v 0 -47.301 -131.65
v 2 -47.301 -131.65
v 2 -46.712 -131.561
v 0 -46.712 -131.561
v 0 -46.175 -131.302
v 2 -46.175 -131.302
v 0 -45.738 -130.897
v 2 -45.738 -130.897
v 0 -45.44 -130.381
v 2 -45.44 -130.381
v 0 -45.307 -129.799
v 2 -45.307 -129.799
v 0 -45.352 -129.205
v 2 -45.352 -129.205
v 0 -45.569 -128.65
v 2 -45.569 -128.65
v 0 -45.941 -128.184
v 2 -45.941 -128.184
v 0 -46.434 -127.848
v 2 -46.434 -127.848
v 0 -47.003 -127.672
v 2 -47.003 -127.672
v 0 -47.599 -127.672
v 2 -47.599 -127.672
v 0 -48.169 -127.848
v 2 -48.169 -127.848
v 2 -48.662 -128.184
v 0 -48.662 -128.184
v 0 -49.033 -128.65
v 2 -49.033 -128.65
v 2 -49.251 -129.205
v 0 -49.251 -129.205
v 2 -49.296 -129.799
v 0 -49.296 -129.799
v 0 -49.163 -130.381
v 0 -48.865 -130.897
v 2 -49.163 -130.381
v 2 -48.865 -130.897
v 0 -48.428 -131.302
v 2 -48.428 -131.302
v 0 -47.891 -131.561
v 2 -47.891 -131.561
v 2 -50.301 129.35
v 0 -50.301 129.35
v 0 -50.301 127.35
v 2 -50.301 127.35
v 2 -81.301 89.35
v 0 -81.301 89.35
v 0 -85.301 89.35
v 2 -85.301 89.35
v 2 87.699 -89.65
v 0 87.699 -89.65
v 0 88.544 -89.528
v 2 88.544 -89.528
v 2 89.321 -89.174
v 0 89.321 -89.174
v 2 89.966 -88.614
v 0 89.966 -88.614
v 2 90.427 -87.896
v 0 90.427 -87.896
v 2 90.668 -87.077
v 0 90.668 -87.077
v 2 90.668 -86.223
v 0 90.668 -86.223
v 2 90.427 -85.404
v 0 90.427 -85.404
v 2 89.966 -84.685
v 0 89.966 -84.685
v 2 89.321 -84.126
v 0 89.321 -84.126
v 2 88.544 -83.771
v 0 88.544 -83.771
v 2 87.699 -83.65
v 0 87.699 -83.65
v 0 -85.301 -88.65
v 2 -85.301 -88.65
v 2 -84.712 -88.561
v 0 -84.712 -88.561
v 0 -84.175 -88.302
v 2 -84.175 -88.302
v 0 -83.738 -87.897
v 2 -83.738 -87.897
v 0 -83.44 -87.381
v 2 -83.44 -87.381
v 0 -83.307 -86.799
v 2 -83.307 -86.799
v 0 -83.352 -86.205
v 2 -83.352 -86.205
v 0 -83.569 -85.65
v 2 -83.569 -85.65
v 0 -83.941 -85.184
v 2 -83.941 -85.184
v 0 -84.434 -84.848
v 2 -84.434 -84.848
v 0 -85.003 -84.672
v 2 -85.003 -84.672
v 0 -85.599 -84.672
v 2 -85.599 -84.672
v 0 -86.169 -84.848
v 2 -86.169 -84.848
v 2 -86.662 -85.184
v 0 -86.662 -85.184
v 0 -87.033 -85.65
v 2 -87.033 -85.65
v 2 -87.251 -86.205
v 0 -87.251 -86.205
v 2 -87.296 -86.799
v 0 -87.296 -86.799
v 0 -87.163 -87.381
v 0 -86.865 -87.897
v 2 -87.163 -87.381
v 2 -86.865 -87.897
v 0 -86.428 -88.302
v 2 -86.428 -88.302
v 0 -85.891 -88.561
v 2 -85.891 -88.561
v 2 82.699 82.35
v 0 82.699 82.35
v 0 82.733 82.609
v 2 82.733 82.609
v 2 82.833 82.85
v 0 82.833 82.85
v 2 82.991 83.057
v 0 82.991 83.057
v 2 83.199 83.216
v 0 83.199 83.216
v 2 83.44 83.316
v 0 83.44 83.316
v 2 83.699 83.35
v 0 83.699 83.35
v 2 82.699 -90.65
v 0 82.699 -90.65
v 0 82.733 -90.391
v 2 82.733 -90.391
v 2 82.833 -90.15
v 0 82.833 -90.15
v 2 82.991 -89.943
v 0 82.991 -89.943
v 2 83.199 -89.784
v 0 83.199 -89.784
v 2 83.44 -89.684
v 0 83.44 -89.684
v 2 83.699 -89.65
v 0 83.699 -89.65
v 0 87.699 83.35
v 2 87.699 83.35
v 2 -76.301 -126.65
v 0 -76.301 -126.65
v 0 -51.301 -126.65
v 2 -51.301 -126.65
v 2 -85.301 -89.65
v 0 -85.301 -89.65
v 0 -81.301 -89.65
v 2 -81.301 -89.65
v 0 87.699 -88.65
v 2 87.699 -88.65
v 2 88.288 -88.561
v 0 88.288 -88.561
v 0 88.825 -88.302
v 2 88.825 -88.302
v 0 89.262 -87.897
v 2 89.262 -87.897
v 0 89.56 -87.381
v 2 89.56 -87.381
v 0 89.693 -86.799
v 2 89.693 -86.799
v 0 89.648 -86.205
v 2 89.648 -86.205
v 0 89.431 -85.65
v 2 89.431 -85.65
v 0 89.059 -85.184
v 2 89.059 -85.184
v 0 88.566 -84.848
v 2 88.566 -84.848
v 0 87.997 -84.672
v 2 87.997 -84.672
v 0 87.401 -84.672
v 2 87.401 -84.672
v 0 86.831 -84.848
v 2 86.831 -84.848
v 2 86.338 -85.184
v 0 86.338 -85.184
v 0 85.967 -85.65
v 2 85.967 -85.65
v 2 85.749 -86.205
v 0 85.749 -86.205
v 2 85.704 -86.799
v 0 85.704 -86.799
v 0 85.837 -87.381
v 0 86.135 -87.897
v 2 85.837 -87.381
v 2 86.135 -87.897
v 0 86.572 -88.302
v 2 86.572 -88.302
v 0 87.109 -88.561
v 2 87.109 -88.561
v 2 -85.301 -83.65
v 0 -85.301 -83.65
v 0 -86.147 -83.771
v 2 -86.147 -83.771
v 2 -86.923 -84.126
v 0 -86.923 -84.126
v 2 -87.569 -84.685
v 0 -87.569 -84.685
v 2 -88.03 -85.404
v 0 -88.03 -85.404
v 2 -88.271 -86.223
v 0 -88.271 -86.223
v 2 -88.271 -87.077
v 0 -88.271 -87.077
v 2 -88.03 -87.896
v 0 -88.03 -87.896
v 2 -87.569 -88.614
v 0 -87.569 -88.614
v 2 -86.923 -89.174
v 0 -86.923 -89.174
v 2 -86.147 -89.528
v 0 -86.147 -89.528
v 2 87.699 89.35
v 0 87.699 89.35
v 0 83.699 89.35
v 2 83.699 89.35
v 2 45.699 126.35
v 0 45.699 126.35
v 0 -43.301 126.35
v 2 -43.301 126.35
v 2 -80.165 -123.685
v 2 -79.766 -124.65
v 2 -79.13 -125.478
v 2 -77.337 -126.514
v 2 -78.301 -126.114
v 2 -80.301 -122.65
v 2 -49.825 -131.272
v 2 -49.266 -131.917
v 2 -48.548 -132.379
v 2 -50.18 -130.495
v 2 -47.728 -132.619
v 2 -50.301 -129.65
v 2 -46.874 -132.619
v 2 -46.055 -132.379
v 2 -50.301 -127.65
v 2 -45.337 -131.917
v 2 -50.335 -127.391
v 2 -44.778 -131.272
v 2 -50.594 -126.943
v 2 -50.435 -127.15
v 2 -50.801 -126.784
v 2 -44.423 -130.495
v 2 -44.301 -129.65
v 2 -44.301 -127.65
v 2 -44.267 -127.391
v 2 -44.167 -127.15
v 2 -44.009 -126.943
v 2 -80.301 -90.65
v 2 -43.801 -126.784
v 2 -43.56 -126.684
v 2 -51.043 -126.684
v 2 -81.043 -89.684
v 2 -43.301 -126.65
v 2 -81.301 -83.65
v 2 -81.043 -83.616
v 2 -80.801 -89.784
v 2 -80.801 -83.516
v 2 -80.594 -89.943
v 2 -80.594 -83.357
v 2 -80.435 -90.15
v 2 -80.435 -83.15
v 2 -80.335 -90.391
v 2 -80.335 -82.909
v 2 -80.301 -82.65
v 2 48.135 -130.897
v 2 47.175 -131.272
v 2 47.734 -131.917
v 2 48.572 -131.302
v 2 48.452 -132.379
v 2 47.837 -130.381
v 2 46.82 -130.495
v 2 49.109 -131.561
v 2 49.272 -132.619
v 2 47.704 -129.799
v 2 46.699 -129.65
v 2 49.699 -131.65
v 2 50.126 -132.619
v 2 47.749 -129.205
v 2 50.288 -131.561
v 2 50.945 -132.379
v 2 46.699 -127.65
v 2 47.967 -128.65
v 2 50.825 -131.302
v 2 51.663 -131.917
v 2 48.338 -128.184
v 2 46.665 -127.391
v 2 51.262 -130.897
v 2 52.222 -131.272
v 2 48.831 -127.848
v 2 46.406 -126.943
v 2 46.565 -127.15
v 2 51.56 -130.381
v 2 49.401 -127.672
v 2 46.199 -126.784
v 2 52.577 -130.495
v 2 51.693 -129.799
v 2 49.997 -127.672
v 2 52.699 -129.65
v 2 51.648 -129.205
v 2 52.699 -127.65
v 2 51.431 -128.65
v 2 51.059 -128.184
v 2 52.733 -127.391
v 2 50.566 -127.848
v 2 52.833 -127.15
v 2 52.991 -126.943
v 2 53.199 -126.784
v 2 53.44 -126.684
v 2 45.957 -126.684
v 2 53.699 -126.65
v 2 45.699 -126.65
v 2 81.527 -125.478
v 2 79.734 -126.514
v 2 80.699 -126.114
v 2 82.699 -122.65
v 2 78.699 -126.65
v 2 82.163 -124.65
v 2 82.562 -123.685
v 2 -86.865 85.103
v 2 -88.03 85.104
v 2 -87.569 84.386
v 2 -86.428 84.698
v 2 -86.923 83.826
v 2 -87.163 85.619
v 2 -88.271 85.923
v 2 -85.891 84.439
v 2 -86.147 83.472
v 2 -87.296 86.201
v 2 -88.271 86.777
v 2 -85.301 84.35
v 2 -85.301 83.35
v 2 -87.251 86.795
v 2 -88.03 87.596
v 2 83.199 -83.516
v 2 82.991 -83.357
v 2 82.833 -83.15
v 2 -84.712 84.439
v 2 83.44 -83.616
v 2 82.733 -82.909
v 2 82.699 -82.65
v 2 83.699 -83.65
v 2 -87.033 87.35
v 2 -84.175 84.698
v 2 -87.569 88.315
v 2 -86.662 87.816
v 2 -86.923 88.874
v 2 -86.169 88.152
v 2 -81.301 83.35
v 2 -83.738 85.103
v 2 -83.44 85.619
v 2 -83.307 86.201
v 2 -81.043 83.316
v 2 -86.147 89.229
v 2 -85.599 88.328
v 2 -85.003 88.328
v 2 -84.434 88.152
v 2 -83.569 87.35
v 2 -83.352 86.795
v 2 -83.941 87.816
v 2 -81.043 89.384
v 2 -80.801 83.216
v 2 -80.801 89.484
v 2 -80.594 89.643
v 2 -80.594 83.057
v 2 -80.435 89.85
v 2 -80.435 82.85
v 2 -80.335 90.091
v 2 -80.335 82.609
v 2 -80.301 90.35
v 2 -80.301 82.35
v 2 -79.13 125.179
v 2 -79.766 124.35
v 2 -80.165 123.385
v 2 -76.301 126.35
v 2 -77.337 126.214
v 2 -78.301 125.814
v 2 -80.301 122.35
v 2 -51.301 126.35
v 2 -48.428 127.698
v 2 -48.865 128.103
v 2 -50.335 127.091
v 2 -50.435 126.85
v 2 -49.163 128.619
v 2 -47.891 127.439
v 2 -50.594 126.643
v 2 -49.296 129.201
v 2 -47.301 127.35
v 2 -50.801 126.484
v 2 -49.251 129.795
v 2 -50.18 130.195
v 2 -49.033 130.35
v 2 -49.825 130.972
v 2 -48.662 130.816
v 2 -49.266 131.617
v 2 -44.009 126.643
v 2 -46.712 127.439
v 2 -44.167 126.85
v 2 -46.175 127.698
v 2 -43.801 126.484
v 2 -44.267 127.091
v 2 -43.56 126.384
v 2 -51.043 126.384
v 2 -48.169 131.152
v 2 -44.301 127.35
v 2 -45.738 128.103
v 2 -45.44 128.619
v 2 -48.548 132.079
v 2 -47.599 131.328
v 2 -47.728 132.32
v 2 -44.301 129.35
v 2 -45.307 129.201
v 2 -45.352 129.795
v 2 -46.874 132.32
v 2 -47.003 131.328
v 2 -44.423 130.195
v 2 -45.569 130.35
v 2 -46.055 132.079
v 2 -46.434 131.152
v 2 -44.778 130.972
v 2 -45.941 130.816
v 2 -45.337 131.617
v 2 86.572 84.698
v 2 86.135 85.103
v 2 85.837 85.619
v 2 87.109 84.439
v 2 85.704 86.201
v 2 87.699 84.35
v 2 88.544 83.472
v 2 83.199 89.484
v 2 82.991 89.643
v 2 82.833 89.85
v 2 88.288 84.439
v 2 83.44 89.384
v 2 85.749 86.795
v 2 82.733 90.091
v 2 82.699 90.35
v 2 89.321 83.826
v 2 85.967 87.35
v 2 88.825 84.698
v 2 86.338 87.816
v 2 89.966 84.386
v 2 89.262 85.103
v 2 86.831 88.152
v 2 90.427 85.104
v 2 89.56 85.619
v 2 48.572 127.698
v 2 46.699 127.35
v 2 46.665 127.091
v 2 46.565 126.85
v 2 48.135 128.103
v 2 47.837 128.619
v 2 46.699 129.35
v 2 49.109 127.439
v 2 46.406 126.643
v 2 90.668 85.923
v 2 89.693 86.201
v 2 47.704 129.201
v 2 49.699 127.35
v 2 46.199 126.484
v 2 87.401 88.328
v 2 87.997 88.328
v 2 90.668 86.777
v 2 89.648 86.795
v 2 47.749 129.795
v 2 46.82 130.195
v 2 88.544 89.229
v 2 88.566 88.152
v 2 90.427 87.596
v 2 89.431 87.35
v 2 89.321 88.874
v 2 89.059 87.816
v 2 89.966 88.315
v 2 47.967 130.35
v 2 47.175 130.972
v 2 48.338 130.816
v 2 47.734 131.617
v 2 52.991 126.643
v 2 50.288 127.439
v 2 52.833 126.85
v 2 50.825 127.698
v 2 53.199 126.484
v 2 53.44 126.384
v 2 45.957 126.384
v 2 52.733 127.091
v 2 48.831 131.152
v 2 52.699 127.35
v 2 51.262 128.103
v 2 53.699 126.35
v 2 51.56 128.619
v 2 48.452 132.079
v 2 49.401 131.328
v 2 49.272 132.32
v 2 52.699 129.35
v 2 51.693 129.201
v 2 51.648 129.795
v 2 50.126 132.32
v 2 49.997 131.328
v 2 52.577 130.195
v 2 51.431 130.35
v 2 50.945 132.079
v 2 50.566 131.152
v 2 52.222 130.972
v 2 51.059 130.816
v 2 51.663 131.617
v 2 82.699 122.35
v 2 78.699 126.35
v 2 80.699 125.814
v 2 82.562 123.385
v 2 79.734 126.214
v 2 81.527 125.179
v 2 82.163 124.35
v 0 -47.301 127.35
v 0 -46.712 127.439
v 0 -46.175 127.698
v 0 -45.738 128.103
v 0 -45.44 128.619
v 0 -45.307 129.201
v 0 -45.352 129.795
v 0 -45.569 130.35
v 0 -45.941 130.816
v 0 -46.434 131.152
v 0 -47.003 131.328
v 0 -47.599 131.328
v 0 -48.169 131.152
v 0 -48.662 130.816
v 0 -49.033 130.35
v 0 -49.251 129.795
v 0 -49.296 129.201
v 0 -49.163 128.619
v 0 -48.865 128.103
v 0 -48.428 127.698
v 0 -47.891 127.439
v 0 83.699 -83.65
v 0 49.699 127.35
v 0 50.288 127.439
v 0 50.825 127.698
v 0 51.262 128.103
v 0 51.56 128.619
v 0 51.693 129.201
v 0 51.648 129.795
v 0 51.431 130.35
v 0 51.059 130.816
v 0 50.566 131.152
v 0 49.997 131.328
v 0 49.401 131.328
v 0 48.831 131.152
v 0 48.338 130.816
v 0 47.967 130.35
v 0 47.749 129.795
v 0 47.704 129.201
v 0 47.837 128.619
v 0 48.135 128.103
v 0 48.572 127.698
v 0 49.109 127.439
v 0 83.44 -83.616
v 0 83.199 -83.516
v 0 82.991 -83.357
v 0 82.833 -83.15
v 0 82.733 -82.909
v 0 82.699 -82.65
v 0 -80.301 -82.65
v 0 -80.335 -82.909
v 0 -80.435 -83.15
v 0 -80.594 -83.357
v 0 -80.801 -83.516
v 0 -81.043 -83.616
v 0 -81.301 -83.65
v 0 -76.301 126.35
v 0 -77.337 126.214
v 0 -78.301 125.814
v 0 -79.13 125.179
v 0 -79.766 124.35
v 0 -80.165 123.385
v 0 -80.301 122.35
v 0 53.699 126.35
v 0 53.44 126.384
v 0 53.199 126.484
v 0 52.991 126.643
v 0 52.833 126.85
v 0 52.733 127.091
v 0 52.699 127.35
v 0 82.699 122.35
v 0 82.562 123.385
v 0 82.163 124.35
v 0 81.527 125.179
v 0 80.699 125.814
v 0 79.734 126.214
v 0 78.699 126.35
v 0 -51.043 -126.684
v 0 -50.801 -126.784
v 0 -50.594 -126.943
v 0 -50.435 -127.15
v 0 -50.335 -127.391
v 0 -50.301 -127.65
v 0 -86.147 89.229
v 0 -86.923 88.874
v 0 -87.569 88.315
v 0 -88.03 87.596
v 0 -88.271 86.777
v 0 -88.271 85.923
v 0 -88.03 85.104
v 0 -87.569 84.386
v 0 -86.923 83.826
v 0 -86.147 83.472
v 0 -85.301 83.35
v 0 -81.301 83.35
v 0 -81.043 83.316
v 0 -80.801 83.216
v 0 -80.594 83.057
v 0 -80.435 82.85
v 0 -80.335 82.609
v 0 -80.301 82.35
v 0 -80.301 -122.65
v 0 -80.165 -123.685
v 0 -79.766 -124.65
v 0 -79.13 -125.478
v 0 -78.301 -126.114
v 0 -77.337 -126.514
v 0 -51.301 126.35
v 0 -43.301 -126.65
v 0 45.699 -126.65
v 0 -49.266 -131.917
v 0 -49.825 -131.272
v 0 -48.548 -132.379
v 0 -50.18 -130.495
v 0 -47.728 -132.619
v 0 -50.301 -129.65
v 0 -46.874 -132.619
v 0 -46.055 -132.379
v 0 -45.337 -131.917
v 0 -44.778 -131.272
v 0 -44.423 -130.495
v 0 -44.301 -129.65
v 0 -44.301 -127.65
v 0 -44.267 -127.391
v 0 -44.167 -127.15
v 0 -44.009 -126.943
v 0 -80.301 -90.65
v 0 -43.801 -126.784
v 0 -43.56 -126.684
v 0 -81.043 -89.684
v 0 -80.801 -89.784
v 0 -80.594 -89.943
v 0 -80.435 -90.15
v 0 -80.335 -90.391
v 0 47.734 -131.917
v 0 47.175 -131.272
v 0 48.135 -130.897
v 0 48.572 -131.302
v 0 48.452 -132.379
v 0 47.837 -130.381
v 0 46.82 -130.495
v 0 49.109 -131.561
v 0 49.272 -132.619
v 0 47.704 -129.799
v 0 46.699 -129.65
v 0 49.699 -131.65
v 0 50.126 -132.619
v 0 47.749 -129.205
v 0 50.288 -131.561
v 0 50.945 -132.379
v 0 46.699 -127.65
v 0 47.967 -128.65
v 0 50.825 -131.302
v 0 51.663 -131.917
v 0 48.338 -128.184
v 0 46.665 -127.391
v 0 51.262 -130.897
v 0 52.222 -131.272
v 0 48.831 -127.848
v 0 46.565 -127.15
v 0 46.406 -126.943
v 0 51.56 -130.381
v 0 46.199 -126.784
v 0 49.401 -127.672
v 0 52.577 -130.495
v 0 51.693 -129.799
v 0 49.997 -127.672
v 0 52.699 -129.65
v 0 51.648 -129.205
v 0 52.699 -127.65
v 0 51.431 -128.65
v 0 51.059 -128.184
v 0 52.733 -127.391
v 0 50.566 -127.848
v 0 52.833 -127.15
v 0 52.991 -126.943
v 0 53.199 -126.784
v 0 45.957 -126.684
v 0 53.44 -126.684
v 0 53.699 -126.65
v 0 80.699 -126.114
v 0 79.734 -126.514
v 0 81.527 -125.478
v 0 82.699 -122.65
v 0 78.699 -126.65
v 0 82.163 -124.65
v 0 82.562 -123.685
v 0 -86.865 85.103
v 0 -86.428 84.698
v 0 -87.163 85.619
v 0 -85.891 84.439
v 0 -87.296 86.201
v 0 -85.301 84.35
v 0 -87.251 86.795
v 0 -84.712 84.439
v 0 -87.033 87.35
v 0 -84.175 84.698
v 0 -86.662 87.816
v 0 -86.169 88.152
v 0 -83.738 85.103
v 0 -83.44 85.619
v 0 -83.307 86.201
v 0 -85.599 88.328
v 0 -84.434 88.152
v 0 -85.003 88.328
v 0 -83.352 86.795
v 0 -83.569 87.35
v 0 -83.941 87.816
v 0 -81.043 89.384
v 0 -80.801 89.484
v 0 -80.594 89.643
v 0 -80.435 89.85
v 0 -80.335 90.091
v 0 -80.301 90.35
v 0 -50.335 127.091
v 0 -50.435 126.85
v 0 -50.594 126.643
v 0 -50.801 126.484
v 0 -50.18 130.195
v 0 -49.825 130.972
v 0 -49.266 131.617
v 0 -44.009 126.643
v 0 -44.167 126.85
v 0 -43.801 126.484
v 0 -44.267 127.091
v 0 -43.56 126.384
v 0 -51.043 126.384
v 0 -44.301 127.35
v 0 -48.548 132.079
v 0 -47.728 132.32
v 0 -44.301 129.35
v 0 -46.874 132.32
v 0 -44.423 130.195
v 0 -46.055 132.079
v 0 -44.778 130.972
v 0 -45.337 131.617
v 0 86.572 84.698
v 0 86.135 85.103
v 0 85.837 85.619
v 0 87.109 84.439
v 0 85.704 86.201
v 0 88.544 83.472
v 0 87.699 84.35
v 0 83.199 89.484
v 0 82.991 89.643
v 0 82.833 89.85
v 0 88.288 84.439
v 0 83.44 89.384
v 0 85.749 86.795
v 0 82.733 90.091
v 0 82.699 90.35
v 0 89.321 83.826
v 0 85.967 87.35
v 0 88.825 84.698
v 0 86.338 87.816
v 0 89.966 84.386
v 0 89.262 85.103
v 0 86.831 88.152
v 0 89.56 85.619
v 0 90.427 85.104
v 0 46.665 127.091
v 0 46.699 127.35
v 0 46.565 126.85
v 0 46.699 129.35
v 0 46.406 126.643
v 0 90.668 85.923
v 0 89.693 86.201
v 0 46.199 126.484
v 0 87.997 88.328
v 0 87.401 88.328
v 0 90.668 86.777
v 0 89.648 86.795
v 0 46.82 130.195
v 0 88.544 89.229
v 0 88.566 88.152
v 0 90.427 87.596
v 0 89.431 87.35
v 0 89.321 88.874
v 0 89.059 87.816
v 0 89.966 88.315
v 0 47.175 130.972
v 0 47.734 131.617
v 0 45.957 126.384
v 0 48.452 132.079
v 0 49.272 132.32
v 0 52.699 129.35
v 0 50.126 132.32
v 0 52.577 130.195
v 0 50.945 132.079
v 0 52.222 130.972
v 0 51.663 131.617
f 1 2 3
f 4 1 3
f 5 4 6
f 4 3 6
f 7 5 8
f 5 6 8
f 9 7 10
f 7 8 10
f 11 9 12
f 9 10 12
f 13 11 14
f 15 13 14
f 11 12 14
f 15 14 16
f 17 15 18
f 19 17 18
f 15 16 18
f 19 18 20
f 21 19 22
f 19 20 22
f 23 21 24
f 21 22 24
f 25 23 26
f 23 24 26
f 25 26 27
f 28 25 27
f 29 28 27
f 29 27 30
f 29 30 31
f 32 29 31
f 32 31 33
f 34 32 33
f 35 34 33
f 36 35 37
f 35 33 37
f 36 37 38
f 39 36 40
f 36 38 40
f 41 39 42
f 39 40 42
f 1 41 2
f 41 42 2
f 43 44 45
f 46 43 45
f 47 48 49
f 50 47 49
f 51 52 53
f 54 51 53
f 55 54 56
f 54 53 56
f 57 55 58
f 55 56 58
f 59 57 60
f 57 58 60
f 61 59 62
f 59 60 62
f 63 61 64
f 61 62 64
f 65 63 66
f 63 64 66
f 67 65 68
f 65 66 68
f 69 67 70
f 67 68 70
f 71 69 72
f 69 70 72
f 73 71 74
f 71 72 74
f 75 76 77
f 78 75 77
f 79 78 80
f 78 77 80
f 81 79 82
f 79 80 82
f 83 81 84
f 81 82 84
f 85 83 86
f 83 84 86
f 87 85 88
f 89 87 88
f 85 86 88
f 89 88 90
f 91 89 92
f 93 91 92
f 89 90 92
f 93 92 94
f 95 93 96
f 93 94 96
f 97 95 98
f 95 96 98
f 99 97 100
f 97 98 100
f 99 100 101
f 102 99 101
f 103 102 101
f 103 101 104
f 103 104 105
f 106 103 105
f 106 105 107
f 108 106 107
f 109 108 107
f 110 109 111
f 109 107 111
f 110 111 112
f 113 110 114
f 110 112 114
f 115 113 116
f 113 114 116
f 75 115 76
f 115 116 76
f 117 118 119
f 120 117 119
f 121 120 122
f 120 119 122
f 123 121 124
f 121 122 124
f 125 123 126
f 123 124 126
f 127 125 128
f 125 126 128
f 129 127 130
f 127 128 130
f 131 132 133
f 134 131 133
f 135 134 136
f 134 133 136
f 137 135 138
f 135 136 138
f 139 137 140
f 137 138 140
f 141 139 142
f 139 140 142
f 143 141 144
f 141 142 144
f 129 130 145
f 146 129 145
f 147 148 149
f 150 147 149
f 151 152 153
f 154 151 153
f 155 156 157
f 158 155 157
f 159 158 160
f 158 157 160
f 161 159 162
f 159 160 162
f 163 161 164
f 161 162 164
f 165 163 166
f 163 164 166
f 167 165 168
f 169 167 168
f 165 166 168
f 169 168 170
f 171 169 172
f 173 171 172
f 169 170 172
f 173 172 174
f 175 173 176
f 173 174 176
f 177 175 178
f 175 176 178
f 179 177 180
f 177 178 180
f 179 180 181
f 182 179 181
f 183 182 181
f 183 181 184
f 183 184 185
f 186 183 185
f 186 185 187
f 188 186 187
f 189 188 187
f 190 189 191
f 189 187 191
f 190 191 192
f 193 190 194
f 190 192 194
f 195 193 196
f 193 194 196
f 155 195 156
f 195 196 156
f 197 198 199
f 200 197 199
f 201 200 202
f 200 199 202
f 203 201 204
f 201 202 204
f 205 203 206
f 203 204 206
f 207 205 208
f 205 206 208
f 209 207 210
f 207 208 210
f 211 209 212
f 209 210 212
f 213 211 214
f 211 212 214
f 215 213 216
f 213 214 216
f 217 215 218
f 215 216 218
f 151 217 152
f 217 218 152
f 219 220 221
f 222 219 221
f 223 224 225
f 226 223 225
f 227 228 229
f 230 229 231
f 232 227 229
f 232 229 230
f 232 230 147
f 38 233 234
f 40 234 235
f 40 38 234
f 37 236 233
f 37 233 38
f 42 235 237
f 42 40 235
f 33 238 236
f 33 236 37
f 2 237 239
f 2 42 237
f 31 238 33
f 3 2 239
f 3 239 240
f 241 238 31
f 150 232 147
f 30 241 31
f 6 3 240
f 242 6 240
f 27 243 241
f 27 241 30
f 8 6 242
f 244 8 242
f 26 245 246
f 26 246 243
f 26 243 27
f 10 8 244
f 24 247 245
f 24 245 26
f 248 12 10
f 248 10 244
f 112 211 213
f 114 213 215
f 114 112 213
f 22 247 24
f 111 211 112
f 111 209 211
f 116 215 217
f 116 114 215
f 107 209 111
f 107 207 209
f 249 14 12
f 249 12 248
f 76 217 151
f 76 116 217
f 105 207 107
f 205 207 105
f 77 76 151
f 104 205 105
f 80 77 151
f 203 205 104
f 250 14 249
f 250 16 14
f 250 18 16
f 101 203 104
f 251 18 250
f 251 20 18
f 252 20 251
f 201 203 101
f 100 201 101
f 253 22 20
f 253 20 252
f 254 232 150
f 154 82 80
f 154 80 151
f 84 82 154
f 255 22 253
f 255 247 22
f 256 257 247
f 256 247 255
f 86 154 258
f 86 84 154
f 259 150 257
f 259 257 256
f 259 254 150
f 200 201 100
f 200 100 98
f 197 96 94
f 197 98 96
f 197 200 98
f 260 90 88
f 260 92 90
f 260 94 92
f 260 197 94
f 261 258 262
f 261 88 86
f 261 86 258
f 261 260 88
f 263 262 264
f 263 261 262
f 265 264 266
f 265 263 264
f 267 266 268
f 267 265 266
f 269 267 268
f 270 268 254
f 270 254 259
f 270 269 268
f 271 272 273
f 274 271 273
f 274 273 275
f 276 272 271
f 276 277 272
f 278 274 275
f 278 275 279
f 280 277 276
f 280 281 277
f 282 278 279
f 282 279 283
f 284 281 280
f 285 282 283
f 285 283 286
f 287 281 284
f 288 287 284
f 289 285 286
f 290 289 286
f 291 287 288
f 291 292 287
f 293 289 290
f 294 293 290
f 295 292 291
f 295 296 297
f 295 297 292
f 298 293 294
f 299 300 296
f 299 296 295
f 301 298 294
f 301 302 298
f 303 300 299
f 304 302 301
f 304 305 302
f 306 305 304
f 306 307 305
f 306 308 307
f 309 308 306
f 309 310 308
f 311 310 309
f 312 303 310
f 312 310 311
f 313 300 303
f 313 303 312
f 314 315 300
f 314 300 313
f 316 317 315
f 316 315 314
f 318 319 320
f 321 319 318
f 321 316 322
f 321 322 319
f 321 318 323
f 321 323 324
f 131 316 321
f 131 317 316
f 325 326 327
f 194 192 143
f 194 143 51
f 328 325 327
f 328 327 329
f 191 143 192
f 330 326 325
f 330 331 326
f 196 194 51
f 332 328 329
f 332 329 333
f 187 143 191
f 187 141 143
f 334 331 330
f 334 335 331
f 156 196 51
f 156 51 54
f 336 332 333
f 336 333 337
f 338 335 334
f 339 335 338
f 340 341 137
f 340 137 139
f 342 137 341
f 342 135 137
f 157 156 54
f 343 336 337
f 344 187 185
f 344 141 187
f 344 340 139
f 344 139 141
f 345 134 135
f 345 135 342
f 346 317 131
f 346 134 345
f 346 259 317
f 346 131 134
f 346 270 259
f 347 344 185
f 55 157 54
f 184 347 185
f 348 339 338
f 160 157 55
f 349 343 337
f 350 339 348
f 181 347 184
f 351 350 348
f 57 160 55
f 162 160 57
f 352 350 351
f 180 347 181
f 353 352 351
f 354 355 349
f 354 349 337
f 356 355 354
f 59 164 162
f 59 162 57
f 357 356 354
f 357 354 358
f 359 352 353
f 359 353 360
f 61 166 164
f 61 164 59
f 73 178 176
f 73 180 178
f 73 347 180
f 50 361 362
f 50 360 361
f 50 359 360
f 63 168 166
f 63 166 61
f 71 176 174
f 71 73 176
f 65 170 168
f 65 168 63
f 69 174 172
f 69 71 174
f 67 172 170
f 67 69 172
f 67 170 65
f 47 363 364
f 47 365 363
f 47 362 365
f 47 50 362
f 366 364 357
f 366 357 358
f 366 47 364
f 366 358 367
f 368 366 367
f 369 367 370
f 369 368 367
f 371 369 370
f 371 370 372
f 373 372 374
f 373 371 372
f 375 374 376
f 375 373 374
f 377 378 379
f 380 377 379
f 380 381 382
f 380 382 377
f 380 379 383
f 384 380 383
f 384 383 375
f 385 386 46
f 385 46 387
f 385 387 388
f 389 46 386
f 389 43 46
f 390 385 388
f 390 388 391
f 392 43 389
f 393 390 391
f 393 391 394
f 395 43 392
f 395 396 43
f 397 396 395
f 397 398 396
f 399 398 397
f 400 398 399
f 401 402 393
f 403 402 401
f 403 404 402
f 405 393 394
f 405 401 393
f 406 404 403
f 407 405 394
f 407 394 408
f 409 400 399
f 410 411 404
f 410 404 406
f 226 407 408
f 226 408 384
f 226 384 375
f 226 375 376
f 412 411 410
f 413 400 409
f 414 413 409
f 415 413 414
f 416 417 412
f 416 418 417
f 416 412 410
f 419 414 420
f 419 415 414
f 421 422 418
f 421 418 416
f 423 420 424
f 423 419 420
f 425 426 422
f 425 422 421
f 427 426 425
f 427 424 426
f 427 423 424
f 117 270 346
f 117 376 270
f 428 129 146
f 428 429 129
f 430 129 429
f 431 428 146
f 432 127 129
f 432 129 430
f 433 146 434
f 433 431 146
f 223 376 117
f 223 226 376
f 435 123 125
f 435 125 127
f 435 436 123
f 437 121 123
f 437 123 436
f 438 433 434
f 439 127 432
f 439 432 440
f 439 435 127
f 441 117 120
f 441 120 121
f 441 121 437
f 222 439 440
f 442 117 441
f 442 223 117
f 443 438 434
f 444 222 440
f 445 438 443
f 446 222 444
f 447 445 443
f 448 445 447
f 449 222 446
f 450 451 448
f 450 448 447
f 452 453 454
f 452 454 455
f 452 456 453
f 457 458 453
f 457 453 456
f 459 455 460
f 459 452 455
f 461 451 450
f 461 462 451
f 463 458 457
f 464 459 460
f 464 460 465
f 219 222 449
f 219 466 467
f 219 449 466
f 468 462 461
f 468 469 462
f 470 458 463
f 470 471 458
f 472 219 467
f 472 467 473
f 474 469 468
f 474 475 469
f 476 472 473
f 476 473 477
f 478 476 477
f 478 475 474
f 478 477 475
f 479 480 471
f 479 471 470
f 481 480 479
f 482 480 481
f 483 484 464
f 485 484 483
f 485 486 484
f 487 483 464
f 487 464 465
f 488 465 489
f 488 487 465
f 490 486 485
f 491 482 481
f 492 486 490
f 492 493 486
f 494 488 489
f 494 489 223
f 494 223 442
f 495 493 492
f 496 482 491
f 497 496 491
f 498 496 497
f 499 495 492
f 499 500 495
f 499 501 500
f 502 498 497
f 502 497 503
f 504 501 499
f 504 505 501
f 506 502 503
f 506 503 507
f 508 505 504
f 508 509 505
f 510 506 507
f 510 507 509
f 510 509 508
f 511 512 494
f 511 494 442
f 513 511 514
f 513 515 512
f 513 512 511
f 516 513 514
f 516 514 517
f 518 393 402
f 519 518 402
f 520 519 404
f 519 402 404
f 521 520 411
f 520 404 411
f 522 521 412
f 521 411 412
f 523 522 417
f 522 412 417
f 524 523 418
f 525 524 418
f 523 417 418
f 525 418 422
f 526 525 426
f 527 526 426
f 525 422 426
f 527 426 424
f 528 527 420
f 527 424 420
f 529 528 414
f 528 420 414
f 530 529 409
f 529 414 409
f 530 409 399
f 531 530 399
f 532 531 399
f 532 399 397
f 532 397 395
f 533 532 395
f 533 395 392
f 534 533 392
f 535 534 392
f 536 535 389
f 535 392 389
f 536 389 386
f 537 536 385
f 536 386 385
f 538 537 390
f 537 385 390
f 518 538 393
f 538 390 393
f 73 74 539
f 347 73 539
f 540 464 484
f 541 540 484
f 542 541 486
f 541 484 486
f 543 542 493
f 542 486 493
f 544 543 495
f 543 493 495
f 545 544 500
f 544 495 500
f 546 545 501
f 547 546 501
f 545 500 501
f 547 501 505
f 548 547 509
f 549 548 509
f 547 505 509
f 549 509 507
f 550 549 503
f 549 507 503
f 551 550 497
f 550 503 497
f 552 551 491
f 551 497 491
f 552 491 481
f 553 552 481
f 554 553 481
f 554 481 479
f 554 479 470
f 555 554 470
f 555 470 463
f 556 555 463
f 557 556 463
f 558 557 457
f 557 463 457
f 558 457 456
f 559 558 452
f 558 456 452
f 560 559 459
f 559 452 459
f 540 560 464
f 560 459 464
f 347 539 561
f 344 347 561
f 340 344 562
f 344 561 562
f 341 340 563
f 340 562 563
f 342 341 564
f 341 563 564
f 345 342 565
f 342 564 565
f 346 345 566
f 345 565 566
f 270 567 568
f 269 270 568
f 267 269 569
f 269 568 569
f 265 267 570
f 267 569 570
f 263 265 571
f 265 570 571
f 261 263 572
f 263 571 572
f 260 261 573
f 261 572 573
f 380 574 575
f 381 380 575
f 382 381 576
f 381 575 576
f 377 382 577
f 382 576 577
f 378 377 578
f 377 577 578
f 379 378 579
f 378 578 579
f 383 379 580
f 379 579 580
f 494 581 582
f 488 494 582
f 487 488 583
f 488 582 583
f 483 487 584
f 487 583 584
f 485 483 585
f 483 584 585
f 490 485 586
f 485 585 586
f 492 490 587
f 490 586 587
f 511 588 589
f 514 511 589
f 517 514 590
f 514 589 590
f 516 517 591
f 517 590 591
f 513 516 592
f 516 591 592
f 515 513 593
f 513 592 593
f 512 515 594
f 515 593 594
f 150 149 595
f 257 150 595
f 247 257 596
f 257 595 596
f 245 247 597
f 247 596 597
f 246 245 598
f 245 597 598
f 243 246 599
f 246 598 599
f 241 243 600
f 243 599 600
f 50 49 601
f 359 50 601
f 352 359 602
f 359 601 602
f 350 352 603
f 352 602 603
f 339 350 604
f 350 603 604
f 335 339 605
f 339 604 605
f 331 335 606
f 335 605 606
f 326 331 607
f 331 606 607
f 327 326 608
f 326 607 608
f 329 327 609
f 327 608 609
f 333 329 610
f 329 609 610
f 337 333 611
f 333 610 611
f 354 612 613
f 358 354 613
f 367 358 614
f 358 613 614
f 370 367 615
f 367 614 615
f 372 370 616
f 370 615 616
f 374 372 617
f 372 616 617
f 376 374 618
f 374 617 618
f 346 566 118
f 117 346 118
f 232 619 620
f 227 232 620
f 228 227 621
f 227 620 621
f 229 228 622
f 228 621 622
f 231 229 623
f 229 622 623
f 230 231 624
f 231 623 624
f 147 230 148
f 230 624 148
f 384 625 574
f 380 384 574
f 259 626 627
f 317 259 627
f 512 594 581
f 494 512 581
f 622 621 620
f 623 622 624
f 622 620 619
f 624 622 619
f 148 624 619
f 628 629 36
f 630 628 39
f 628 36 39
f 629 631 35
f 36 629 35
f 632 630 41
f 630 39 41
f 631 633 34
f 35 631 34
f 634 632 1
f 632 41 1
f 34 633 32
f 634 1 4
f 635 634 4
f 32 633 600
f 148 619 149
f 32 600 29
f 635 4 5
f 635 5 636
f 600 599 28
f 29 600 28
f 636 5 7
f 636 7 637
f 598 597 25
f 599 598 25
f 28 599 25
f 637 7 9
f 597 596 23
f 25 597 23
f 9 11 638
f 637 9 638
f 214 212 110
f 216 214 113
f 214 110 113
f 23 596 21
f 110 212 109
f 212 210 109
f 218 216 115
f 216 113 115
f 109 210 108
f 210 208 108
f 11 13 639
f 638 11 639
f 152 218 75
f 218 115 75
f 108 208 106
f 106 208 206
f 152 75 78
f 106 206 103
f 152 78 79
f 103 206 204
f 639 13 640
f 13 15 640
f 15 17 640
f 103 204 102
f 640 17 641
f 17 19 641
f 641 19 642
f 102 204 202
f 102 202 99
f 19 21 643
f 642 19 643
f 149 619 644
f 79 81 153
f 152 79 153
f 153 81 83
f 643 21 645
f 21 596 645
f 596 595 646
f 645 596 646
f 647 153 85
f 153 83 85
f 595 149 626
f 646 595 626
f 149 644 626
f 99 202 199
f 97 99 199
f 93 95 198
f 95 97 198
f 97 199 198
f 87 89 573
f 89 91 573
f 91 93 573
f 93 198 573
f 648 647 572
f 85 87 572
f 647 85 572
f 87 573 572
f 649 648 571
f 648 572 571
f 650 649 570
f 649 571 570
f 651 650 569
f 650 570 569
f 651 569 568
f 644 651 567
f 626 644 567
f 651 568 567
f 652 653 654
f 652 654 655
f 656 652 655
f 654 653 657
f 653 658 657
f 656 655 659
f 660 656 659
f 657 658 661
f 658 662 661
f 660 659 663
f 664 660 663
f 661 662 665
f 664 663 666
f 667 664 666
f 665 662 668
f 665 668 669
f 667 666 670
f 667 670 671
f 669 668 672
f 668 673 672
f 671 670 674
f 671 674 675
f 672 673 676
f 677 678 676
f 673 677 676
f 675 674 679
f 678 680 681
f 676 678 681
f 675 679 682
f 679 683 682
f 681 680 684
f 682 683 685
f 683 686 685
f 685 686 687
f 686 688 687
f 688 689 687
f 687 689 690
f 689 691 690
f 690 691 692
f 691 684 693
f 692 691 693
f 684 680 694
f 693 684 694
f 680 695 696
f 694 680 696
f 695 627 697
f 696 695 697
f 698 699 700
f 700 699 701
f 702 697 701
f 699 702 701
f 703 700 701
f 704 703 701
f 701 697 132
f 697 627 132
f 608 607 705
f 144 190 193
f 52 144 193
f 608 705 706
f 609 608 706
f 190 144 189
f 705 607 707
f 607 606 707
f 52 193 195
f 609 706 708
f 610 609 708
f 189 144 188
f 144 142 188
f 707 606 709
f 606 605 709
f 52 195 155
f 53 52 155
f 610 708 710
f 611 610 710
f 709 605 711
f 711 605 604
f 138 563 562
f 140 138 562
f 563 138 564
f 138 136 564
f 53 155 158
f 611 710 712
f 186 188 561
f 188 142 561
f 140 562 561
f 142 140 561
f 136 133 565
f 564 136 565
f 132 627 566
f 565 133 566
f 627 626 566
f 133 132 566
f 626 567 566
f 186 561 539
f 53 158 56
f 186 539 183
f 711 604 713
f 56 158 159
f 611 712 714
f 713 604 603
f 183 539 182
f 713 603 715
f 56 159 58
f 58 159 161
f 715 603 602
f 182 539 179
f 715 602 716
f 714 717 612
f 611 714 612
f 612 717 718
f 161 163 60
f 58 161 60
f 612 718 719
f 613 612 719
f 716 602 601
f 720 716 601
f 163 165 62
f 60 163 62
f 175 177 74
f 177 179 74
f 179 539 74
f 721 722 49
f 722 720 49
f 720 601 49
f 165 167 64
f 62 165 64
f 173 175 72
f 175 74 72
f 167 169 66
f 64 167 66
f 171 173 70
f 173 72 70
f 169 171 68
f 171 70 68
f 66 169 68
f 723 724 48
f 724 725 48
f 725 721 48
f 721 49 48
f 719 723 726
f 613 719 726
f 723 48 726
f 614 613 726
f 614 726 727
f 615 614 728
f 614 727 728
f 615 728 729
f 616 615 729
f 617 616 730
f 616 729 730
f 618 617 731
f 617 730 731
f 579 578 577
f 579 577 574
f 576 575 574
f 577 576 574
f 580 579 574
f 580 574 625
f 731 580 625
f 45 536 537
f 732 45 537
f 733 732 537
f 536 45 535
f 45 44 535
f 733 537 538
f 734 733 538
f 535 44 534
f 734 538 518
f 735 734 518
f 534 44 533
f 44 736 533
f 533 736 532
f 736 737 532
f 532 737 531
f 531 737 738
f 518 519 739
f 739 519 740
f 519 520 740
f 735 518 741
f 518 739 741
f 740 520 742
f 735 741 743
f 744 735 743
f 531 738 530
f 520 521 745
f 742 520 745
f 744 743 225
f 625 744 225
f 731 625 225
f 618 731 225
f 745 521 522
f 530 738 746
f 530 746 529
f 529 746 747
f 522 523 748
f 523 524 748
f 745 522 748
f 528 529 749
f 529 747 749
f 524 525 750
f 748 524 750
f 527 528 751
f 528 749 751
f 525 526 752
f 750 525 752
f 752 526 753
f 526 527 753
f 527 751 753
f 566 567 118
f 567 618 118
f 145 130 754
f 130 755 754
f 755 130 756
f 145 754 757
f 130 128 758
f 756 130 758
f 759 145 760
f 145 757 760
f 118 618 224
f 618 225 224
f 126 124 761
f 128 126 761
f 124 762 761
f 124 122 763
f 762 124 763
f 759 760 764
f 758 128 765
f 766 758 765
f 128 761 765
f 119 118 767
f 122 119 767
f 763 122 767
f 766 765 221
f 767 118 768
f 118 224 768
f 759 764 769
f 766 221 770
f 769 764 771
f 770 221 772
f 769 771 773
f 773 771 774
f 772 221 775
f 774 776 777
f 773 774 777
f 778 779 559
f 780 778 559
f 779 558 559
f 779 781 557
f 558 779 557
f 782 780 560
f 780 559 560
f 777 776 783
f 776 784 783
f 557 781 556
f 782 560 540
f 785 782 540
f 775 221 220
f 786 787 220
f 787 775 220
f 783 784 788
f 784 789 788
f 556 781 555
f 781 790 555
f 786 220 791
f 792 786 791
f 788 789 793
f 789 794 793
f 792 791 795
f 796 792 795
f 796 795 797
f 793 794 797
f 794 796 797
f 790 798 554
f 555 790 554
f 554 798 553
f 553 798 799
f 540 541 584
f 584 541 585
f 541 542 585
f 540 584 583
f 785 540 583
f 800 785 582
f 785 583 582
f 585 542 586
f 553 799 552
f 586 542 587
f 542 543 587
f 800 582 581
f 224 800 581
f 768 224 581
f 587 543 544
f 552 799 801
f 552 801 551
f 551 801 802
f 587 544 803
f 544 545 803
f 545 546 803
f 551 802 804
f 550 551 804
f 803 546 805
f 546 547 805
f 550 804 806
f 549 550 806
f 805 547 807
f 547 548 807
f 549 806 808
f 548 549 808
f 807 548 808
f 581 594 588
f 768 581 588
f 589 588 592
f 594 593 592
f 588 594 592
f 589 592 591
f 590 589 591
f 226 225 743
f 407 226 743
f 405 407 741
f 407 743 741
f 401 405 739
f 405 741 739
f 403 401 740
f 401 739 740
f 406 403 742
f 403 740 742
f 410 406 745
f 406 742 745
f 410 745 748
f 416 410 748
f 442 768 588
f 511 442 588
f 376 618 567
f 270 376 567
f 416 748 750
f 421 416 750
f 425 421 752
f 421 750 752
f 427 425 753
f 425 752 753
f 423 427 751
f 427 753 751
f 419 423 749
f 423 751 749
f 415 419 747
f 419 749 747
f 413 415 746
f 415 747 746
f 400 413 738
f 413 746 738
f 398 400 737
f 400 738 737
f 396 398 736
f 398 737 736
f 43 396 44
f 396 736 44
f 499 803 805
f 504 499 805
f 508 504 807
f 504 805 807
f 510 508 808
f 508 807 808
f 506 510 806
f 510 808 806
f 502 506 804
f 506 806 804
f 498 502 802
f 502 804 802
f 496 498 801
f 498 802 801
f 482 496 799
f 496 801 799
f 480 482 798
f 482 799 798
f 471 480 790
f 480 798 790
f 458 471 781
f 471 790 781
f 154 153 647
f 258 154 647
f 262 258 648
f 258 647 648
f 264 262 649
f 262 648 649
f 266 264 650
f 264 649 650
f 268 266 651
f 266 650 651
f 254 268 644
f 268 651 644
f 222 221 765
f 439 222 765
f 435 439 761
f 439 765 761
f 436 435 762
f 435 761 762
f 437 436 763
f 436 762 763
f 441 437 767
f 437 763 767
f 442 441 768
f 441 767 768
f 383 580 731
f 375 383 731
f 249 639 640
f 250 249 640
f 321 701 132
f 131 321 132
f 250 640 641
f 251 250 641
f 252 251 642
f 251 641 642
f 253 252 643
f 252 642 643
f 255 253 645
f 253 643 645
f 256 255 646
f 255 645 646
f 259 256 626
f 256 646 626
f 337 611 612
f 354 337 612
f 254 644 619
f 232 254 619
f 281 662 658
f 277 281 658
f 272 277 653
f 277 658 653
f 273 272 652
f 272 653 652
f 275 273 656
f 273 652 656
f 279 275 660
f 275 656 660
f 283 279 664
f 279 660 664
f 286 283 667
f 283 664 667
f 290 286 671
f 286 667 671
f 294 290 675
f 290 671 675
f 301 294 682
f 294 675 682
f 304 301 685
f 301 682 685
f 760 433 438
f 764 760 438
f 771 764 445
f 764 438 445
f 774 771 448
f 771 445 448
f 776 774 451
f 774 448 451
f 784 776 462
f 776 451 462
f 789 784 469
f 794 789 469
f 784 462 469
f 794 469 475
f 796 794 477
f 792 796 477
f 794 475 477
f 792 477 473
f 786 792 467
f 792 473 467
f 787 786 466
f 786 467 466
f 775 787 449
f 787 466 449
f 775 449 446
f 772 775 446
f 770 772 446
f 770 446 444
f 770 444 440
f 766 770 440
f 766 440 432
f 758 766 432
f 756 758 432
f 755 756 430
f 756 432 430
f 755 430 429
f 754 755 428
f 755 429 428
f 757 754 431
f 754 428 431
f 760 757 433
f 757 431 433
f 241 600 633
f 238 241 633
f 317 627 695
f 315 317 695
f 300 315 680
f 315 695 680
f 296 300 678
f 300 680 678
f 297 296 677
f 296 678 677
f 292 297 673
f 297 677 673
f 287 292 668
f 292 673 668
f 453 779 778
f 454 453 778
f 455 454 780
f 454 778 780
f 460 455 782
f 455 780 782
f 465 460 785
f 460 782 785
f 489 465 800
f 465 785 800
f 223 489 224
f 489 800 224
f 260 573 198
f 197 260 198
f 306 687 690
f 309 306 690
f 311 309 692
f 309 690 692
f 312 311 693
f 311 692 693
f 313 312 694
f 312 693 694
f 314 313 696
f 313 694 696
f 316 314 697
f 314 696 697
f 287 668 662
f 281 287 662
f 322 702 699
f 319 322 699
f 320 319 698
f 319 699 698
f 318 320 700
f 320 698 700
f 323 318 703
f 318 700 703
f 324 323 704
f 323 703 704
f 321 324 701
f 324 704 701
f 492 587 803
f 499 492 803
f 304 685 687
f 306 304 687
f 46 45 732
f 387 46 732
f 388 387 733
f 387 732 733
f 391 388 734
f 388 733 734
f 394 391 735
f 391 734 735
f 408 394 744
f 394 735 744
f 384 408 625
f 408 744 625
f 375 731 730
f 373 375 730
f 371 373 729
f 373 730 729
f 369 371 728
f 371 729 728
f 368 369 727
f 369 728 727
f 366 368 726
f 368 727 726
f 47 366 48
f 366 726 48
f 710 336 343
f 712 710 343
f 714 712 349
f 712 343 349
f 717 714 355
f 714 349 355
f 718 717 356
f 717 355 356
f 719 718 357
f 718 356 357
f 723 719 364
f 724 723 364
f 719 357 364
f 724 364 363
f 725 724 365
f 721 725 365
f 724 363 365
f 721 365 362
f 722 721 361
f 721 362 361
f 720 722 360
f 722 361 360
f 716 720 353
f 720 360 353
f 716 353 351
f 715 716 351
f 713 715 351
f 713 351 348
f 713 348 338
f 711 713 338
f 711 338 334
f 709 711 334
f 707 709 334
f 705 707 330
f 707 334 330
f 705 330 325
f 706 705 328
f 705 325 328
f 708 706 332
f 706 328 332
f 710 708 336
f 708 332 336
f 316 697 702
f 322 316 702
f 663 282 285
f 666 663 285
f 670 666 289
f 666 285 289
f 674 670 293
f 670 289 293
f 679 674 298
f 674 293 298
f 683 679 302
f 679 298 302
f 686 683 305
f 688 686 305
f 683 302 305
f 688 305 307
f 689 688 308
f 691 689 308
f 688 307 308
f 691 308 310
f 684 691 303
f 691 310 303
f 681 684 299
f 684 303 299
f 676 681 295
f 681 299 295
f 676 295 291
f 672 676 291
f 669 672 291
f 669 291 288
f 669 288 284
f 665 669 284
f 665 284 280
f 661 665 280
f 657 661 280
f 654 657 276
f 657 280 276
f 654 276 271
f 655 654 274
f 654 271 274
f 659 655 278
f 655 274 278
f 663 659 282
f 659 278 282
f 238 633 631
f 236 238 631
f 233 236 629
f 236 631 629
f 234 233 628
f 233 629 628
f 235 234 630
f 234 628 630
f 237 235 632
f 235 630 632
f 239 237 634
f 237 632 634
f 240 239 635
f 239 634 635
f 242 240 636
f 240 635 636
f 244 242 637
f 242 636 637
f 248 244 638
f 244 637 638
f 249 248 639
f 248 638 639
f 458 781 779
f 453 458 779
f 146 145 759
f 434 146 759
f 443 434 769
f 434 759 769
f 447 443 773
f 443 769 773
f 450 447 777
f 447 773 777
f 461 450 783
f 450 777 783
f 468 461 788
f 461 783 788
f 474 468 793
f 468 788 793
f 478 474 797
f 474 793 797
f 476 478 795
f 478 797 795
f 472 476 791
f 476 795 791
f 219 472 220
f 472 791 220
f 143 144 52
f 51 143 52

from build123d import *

# Parameters (mm, degrees)
Y_KSEKLIK_EKSTR_ZYON1_DEPTH = 2
IZIM2_R                     = 2
KES_EKSTR_ZYON1_DEPTH       = 2


with BuildPart() as part:
    # Çizim1 → Yükseklik-Ekstrüzyon1 (new body)
    with BuildSketch(Plane.YZ):
        with BuildLine():
            Line((78.698599078, 126.350175115), (53.698599078, 126.350175115))
            ThreePointArc((53.698599078, 126.350175115), (52.991492297, 126.643068334), (52.698599078, 127.350175115))
            Line((52.698599078, 127.350175115), (52.698599078, 129.350175115))
            ThreePointArc((52.698599078, 129.350175115), (49.698599078, 132.350175115), (46.698599078, 129.350175115))
            Line((46.698599078, 129.350175115), (46.698599078, 127.350175115))
            ThreePointArc((46.698599078, 127.350175115), (46.40570586, 126.643068334), (45.698599078, 126.350175115))
            Line((45.698599078, 126.350175115), (-43.301400922, 126.350175115))
            ThreePointArc((-43.301400922, 126.350175115), (-44.008507703, 126.643068334), (-44.301400922, 127.350175115))
            Line((-44.301400922, 127.350175115), (-44.301400922, 129.350175115))
            ThreePointArc((-44.301400922, 129.350175115), (-47.301400922, 132.350175115), (-50.301400922, 129.350175115))
            Line((-50.301400922, 129.350175115), (-50.301400922, 127.350175115))
            ThreePointArc((-50.301400922, 127.350175115), (-50.59429414, 126.643068334), (-51.301400922, 126.350175115))
            Line((-51.301400922, 126.350175115), (-76.301400922, 126.350175115))
            ThreePointArc((-76.301400922, 126.350175115), (-79.129828046, 125.17860224), (-80.301400922, 122.350175115))
            Line((-80.301400922, 122.350175115), (-80.301400922, 90.350175115))
            ThreePointArc((-80.301400922, 90.350175115), (-80.59429414, 89.643068334), (-81.301400922, 89.350175115))
            Line((-81.301400922, 89.350175115), (-85.301400922, 89.350175115))
            ThreePointArc((-85.301400922, 89.350175115), (-88.301400922, 86.350175115), (-85.301400922, 83.350175115))
            Line((-85.301400922, 83.350175115), (-81.301400922, 83.350175115))
            ThreePointArc((-81.301400922, 83.350175115), (-80.59429414, 83.057281896), (-80.301400922, 82.350175115))
            Line((-80.301400922, 82.350175115), (-80.301400922, -82.649824885))
            ThreePointArc((-80.301400922, -82.649824885), (-80.59429414, -83.356931666), (-81.301400922, -83.649824885))
            Line((-81.301400922, -83.649824885), (-85.301400922, -83.649824885))
            ThreePointArc((-85.301400922, -83.649824885), (-88.301400922, -86.649824885), (-85.301400922, -89.649824885))
            Line((-85.301400922, -89.649824885), (-81.301400922, -89.649824885))
            ThreePointArc((-81.301400922, -89.649824885), (-80.59429414, -89.942718104), (-80.301400922, -90.649824885))
            Line((-80.301400922, -90.649824885), (-80.301400922, -122.649824885))
            ThreePointArc((-80.301400922, -122.649824885), (-79.129828046, -125.47825201), (-76.301400922, -126.649824885))
            Line((-76.301400922, -126.649824885), (-51.301400922, -126.649824885))
            ThreePointArc((-51.301400922, -126.649824885), (-50.59429414, -126.942718104), (-50.301400922, -127.649824885))
            Line((-50.301400922, -127.649824885), (-50.301400922, -129.649824885))
            ThreePointArc((-50.301400922, -129.649824885), (-47.301400922, -132.649824885), (-44.301400922, -129.649824885))
            Line((-44.301400922, -129.649824885), (-44.301400922, -127.649824885))
            ThreePointArc((-44.301400922, -127.649824885), (-44.008507703, -126.942718104), (-43.301400922, -126.649824885))
            Line((-43.301400922, -126.649824885), (45.698599078, -126.649824885))
            ThreePointArc((45.698599078, -126.649824885), (46.40570586, -126.942718104), (46.698599078, -127.649824885))
            Line((46.698599078, -127.649824885), (46.698599078, -129.649824885))
            ThreePointArc((46.698599078, -129.649824885), (49.698599078, -132.649824885), (52.698599078, -129.649824885))
            Line((52.698599078, -129.649824885), (52.698599078, -127.649824885))
            ThreePointArc((52.698599078, -127.649824885), (52.991492297, -126.942718104), (53.698599078, -126.649824885))
            Line((53.698599078, -126.649824885), (78.698599078, -126.649824885))
            ThreePointArc((78.698599078, -126.649824885), (81.527026203, -125.47825201), (82.698599078, -122.649824885))
            Line((82.698599078, -122.649824885), (82.698599078, -90.649824885))
            ThreePointArc((82.698599078, -90.649824885), (82.991492297, -89.942718104), (83.698599078, -89.649824885))
            Line((83.698599078, -89.649824885), (87.698599078, -89.649824885))
            ThreePointArc((87.698599078, -89.649824885), (90.698599078, -86.649824885), (87.698599078, -83.649824885))
            Line((87.698599078, -83.649824885), (83.698599078, -83.649824885))
            ThreePointArc((83.698599078, -83.649824885), (82.991492297, -83.356931666), (82.698599078, -82.649824885))
            Line((82.698599078, -82.649824885), (82.698599078, 82.350175115))
            ThreePointArc((82.698599078, 82.350175115), (82.991492297, 83.057281896), (83.698599078, 83.350175115))
            Line((83.698599078, 83.350175115), (87.698599078, 83.350175115))
            ThreePointArc((87.698599078, 83.350175115), (90.698599078, 86.350175115), (87.698599078, 89.350175115))
            Line((87.698599078, 89.350175115), (83.698599078, 89.350175115))
            ThreePointArc((83.698599078, 89.350175115), (82.991492297, 89.643068334), (82.698599078, 90.350175115))
            Line((82.698599078, 90.350175115), (82.698599078, 122.350175115))
            ThreePointArc((82.698599078, 122.350175115), (81.527026203, 125.17860224), (78.698599078, 126.350175115))
        make_face()
    extrude(amount=Y_KSEKLIK_EKSTR_ZYON1_DEPTH)

    # Çizim2 → Kes-Ekstrüzyon1 (cut)
    with BuildSketch(Plane.YZ.offset(2)):
        with Locations(Location((-47.301400922, 129.350175115, 0), (0, 0, 270))):
            Circle(IZIM2_R)
    kes_ekstr_zyon1 = extrude(amount=-KES_EKSTR_ZYON1_DEPTH, mode=Mode.SUBTRACT)

    # Çizim-Çoğaltma1: Kes-Ekstrüzyon1 at 7 more places
    with Locations((0, 97, 0), (0, 135, -43), (0, -38, -43), (0, -38, -216), (0, 0, -259), (0, 97, -259), (0, 135, -216)):
        add(kes_ekstr_zyon1, mode=Mode.SUBTRACT)


solid = part.part
